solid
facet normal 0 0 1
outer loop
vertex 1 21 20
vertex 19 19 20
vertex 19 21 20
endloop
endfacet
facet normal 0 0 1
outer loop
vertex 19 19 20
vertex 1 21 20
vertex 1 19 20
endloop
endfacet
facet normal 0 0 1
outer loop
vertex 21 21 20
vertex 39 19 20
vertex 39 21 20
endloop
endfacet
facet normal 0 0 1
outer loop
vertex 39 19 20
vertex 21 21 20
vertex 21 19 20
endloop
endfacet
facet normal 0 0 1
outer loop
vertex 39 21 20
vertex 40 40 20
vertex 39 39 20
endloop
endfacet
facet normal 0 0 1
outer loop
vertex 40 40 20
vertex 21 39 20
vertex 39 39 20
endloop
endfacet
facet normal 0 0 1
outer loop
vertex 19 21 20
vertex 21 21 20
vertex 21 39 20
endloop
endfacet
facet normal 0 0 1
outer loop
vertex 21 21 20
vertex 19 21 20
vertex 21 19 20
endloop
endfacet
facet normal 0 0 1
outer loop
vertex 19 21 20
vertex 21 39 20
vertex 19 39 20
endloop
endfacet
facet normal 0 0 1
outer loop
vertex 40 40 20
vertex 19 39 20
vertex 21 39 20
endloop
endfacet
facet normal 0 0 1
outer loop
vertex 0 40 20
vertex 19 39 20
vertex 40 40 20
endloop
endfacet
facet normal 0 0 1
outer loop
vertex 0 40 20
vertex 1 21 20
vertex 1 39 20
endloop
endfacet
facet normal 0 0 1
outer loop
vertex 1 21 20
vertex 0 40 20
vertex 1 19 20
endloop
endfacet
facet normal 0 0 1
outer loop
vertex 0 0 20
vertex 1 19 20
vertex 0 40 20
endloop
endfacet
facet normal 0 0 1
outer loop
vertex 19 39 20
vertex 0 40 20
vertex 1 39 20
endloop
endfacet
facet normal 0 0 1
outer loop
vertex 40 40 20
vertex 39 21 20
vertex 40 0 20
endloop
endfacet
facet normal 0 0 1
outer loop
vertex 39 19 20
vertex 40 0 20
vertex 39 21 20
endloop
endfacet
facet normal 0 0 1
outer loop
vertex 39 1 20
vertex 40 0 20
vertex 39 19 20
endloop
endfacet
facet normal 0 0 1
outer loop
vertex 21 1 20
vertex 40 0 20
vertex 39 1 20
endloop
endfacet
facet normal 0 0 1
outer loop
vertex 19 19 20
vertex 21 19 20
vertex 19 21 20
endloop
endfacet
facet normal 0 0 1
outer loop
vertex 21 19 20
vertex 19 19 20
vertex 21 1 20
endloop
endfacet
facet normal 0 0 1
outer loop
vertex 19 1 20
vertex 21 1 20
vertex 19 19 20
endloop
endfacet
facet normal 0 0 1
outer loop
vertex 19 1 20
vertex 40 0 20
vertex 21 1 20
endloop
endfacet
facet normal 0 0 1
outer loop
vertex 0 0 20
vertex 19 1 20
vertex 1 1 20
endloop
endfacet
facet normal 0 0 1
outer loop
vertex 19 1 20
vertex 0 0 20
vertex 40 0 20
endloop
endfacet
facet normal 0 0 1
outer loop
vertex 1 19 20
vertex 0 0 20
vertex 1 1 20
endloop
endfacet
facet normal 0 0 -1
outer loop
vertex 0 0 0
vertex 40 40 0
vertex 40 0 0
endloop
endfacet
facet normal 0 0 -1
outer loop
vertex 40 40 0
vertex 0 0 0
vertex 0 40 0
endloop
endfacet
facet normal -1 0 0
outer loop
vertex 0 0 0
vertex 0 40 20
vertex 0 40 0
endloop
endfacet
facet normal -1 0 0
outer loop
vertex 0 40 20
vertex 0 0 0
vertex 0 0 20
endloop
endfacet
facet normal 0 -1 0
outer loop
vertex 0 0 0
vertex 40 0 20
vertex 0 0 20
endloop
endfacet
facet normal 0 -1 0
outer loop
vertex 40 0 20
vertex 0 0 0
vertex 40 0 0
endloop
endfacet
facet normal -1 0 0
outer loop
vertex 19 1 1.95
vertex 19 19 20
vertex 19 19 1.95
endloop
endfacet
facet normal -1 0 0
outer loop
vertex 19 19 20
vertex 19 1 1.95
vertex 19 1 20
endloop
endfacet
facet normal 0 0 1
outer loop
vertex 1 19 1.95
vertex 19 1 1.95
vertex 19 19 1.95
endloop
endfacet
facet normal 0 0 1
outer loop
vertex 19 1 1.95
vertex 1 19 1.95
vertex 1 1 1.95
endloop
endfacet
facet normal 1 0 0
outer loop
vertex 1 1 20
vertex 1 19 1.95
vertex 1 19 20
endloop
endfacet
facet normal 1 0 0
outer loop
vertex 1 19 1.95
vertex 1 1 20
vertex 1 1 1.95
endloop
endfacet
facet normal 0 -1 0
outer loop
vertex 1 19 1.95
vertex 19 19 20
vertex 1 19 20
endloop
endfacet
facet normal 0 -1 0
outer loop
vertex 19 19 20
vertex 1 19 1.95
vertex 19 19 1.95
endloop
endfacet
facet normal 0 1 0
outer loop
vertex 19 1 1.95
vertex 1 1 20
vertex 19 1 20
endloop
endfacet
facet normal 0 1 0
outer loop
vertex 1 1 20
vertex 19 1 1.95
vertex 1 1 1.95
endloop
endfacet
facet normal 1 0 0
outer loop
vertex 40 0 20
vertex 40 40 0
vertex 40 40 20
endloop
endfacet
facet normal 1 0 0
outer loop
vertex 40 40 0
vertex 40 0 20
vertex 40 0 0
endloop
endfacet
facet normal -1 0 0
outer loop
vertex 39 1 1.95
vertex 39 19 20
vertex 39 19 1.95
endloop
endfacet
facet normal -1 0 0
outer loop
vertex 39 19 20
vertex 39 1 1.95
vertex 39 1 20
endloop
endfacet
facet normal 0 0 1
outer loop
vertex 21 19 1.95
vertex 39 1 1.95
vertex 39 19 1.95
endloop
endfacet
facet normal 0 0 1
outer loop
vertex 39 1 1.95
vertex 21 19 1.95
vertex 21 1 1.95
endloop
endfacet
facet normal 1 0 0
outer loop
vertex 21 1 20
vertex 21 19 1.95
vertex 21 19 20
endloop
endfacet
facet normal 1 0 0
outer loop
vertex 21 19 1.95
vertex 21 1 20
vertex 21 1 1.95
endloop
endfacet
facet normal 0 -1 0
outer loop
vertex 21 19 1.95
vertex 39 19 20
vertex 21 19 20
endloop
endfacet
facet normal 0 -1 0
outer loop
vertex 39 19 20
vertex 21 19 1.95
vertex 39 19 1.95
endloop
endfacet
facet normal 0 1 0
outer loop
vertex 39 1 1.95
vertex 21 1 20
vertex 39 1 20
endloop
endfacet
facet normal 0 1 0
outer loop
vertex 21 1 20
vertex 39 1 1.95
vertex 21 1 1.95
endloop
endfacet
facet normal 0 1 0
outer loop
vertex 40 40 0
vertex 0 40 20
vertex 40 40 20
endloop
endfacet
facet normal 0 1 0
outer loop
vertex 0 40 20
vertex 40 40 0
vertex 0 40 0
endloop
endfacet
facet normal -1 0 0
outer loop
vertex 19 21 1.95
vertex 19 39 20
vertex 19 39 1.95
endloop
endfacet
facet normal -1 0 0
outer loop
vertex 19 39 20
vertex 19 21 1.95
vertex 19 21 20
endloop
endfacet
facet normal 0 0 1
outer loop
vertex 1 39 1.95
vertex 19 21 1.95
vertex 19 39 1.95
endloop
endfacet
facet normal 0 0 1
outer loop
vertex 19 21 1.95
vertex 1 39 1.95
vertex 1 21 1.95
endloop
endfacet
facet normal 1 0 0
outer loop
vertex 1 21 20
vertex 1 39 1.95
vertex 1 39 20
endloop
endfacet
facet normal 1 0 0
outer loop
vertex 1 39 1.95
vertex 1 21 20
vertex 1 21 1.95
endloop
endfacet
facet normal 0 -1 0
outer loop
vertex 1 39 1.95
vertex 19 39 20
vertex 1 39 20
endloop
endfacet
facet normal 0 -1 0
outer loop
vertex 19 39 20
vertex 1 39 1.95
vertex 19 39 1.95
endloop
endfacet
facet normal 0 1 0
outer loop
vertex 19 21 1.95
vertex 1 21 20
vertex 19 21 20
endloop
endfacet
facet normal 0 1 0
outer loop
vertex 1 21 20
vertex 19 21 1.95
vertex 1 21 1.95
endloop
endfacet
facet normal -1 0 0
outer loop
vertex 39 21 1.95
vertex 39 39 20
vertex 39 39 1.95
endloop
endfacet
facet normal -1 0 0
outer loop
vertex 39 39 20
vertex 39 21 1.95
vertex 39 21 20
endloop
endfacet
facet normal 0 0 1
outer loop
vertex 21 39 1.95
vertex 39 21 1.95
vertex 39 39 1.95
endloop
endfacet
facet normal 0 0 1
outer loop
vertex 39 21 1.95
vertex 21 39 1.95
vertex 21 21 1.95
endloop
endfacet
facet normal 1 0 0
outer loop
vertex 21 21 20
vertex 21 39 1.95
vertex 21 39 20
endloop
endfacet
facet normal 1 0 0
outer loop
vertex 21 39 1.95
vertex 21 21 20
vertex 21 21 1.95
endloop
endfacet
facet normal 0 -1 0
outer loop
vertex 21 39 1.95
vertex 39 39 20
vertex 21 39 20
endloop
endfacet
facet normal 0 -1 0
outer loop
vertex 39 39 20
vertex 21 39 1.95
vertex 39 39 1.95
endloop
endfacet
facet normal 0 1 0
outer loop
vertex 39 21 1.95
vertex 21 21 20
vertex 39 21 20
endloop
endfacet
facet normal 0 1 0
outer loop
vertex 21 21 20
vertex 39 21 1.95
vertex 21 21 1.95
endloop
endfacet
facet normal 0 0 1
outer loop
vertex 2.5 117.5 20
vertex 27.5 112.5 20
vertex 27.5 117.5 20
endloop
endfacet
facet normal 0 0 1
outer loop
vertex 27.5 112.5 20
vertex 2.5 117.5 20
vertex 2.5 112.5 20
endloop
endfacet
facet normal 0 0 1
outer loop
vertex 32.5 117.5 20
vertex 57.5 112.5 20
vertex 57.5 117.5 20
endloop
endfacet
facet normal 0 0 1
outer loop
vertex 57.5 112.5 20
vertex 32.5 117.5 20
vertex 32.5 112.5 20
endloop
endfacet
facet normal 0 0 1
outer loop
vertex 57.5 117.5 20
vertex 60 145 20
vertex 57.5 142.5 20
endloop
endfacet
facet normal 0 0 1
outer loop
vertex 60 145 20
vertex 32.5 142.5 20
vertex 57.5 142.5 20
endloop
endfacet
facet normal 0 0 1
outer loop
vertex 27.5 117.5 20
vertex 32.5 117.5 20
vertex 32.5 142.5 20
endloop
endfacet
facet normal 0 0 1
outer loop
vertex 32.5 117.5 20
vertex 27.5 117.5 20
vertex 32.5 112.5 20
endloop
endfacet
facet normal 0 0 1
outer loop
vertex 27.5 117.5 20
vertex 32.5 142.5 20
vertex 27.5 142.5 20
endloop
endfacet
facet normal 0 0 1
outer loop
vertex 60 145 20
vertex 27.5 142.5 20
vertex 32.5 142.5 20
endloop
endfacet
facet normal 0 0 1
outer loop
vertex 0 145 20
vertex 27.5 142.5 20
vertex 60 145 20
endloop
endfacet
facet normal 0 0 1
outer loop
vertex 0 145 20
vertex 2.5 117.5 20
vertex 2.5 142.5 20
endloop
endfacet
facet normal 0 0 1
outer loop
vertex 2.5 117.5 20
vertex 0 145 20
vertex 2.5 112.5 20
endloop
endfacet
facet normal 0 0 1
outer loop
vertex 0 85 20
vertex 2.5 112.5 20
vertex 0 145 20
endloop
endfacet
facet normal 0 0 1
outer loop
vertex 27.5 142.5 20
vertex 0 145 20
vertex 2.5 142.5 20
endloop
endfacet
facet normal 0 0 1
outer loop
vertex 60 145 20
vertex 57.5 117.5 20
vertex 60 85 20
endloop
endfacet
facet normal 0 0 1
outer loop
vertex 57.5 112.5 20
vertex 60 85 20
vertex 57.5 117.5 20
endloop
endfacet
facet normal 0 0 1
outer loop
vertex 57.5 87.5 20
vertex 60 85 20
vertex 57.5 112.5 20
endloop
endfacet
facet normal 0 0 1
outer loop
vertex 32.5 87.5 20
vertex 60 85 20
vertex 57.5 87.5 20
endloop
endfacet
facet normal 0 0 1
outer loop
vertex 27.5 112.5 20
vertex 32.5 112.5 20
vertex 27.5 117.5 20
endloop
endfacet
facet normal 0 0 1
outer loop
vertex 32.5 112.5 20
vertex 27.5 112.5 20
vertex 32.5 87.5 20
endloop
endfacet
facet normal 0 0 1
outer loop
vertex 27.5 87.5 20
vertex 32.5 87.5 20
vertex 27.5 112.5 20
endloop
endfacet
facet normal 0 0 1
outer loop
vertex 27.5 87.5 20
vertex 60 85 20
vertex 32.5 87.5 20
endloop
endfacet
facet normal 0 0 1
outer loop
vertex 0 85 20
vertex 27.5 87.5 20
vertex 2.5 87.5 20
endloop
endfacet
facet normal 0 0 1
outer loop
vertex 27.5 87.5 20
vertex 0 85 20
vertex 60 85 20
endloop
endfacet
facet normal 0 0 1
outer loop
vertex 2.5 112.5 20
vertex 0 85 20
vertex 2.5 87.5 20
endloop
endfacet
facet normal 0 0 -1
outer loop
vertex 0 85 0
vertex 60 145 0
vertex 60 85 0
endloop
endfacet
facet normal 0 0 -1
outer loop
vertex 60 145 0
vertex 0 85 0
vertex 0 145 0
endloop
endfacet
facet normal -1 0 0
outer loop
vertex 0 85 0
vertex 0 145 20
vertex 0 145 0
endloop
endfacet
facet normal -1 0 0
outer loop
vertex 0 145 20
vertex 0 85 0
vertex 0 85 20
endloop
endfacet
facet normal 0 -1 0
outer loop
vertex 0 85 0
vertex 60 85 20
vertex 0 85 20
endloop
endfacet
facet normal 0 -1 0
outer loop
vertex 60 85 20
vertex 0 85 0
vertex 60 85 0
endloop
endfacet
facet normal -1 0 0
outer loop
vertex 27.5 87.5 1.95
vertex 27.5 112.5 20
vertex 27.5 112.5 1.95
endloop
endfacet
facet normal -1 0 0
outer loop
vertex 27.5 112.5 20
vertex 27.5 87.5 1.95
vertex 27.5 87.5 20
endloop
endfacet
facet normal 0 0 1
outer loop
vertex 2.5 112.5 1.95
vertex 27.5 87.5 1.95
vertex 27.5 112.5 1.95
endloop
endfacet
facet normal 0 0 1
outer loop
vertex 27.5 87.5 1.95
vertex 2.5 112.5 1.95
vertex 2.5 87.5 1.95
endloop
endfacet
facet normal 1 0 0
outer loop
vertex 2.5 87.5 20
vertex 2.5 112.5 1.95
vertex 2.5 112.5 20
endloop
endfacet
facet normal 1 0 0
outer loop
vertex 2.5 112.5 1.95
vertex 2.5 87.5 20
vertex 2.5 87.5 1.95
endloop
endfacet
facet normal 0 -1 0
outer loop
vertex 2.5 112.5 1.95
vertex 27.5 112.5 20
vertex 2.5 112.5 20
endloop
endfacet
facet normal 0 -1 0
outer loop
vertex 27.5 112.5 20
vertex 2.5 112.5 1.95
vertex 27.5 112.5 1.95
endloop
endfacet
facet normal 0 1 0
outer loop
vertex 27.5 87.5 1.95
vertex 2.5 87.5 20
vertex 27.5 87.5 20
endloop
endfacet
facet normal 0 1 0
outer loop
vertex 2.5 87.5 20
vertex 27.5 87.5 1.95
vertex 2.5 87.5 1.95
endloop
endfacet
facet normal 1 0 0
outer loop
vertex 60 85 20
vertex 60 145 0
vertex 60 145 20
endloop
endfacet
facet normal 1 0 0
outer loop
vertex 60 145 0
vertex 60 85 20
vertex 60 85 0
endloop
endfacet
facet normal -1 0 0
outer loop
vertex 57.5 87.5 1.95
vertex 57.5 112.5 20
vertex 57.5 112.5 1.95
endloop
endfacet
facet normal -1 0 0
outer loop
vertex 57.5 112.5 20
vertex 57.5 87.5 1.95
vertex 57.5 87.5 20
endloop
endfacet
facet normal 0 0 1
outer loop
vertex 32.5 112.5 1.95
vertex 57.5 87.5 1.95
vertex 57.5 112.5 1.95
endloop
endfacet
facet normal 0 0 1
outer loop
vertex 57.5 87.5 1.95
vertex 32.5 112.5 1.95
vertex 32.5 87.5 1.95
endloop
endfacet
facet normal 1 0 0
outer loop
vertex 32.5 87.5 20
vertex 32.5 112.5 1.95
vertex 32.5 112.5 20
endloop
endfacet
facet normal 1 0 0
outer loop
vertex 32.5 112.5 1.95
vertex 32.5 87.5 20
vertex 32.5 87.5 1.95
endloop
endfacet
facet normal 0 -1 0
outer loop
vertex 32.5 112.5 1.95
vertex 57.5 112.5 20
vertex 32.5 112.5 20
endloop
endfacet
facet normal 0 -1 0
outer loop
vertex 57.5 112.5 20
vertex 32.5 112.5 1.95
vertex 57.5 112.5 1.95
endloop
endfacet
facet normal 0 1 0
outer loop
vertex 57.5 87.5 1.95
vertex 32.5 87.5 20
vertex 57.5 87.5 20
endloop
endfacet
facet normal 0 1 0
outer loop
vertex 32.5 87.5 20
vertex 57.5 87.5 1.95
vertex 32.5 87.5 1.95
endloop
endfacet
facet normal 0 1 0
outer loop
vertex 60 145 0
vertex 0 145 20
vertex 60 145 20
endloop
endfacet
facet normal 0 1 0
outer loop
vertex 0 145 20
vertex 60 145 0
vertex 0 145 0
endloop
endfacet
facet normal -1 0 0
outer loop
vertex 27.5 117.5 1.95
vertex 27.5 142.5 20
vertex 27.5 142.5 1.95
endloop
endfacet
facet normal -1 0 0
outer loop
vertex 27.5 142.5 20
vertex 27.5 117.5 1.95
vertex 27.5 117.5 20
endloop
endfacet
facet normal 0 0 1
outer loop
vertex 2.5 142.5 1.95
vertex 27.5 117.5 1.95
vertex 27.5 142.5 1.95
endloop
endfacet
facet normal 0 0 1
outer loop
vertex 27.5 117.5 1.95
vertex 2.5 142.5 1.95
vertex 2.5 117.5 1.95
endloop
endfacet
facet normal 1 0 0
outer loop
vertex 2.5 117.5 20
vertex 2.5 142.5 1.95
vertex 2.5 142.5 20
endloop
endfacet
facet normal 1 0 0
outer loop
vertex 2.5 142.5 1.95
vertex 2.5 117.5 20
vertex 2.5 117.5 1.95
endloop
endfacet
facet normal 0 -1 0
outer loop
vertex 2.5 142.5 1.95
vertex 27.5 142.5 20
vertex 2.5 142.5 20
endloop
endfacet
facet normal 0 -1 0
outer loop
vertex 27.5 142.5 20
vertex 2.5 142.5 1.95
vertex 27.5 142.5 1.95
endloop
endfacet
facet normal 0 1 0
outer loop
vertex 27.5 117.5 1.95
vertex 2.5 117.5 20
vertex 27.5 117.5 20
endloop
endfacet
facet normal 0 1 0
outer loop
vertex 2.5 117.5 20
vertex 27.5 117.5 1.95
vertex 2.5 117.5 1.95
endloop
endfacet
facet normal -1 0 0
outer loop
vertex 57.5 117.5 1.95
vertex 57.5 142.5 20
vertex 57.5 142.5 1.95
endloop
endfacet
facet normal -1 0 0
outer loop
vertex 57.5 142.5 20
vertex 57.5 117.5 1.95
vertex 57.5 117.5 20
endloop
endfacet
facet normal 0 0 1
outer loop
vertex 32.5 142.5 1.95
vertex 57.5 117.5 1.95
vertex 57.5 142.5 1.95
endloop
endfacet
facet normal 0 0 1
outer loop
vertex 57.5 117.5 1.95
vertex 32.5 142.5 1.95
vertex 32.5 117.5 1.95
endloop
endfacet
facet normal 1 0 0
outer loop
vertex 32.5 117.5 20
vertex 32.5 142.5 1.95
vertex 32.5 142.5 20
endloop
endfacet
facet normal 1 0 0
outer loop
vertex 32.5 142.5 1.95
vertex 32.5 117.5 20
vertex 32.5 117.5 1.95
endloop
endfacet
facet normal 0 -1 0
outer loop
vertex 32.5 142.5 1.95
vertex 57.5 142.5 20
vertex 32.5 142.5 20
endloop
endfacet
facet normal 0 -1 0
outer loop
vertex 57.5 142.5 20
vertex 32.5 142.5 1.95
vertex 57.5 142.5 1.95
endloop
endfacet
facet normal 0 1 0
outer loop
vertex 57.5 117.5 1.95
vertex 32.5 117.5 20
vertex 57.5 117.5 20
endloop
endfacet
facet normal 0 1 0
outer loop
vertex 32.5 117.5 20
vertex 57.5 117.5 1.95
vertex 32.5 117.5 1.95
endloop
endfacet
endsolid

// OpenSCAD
module box20hole18(x,y){
difference(){
    translate([0,0,20/2])cube([20,20,20],center=true);
    translate([0,0,2+18/2])cube([18,18,18.1],center=true);
}
}
module box30hole25(x,y){
difference(){
    translate([0,0,20/2])cube([30,30,20],center=true);
    translate([0,0,2+18/2])cube([25,25,18.1],center=true);
}
}

translate([10,10,0])box20hole18();
translate([30,10,0])box20hole18();
translate([10,30,0])box20hole18();
translate([30,30,0])box20hole18();

translate([15,100,0])box30hole25();
translate([45,100,0])box30hole25();
translate([15,130,0])box30hole25();
translate([45,130,0])box30hole25();
